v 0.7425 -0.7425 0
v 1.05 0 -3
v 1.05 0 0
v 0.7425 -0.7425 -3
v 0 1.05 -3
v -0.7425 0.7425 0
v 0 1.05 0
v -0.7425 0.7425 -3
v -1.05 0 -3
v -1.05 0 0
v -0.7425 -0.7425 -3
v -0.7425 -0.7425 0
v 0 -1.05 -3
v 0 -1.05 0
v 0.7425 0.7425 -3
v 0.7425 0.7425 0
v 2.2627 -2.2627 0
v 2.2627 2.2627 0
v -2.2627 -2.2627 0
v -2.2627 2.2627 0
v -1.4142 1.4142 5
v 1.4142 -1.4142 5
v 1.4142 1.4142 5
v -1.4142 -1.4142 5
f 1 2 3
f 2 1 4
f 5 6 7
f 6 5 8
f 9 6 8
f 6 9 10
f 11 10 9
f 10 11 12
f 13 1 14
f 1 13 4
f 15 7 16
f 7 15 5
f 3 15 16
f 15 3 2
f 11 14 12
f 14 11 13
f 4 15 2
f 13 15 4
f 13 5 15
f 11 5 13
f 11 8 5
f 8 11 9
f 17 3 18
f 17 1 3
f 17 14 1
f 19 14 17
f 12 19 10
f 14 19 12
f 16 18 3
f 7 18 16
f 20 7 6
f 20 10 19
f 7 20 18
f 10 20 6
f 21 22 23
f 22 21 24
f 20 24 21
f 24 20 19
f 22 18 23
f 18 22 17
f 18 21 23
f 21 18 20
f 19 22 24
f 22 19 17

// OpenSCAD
rotate([0,180,0])
union() {
cylinder(h=3, r=1.05, $fn=8);
rotate([0,180,45]) cylinder(h=5, r1=3.2, r2=2, $fn=4);
}
